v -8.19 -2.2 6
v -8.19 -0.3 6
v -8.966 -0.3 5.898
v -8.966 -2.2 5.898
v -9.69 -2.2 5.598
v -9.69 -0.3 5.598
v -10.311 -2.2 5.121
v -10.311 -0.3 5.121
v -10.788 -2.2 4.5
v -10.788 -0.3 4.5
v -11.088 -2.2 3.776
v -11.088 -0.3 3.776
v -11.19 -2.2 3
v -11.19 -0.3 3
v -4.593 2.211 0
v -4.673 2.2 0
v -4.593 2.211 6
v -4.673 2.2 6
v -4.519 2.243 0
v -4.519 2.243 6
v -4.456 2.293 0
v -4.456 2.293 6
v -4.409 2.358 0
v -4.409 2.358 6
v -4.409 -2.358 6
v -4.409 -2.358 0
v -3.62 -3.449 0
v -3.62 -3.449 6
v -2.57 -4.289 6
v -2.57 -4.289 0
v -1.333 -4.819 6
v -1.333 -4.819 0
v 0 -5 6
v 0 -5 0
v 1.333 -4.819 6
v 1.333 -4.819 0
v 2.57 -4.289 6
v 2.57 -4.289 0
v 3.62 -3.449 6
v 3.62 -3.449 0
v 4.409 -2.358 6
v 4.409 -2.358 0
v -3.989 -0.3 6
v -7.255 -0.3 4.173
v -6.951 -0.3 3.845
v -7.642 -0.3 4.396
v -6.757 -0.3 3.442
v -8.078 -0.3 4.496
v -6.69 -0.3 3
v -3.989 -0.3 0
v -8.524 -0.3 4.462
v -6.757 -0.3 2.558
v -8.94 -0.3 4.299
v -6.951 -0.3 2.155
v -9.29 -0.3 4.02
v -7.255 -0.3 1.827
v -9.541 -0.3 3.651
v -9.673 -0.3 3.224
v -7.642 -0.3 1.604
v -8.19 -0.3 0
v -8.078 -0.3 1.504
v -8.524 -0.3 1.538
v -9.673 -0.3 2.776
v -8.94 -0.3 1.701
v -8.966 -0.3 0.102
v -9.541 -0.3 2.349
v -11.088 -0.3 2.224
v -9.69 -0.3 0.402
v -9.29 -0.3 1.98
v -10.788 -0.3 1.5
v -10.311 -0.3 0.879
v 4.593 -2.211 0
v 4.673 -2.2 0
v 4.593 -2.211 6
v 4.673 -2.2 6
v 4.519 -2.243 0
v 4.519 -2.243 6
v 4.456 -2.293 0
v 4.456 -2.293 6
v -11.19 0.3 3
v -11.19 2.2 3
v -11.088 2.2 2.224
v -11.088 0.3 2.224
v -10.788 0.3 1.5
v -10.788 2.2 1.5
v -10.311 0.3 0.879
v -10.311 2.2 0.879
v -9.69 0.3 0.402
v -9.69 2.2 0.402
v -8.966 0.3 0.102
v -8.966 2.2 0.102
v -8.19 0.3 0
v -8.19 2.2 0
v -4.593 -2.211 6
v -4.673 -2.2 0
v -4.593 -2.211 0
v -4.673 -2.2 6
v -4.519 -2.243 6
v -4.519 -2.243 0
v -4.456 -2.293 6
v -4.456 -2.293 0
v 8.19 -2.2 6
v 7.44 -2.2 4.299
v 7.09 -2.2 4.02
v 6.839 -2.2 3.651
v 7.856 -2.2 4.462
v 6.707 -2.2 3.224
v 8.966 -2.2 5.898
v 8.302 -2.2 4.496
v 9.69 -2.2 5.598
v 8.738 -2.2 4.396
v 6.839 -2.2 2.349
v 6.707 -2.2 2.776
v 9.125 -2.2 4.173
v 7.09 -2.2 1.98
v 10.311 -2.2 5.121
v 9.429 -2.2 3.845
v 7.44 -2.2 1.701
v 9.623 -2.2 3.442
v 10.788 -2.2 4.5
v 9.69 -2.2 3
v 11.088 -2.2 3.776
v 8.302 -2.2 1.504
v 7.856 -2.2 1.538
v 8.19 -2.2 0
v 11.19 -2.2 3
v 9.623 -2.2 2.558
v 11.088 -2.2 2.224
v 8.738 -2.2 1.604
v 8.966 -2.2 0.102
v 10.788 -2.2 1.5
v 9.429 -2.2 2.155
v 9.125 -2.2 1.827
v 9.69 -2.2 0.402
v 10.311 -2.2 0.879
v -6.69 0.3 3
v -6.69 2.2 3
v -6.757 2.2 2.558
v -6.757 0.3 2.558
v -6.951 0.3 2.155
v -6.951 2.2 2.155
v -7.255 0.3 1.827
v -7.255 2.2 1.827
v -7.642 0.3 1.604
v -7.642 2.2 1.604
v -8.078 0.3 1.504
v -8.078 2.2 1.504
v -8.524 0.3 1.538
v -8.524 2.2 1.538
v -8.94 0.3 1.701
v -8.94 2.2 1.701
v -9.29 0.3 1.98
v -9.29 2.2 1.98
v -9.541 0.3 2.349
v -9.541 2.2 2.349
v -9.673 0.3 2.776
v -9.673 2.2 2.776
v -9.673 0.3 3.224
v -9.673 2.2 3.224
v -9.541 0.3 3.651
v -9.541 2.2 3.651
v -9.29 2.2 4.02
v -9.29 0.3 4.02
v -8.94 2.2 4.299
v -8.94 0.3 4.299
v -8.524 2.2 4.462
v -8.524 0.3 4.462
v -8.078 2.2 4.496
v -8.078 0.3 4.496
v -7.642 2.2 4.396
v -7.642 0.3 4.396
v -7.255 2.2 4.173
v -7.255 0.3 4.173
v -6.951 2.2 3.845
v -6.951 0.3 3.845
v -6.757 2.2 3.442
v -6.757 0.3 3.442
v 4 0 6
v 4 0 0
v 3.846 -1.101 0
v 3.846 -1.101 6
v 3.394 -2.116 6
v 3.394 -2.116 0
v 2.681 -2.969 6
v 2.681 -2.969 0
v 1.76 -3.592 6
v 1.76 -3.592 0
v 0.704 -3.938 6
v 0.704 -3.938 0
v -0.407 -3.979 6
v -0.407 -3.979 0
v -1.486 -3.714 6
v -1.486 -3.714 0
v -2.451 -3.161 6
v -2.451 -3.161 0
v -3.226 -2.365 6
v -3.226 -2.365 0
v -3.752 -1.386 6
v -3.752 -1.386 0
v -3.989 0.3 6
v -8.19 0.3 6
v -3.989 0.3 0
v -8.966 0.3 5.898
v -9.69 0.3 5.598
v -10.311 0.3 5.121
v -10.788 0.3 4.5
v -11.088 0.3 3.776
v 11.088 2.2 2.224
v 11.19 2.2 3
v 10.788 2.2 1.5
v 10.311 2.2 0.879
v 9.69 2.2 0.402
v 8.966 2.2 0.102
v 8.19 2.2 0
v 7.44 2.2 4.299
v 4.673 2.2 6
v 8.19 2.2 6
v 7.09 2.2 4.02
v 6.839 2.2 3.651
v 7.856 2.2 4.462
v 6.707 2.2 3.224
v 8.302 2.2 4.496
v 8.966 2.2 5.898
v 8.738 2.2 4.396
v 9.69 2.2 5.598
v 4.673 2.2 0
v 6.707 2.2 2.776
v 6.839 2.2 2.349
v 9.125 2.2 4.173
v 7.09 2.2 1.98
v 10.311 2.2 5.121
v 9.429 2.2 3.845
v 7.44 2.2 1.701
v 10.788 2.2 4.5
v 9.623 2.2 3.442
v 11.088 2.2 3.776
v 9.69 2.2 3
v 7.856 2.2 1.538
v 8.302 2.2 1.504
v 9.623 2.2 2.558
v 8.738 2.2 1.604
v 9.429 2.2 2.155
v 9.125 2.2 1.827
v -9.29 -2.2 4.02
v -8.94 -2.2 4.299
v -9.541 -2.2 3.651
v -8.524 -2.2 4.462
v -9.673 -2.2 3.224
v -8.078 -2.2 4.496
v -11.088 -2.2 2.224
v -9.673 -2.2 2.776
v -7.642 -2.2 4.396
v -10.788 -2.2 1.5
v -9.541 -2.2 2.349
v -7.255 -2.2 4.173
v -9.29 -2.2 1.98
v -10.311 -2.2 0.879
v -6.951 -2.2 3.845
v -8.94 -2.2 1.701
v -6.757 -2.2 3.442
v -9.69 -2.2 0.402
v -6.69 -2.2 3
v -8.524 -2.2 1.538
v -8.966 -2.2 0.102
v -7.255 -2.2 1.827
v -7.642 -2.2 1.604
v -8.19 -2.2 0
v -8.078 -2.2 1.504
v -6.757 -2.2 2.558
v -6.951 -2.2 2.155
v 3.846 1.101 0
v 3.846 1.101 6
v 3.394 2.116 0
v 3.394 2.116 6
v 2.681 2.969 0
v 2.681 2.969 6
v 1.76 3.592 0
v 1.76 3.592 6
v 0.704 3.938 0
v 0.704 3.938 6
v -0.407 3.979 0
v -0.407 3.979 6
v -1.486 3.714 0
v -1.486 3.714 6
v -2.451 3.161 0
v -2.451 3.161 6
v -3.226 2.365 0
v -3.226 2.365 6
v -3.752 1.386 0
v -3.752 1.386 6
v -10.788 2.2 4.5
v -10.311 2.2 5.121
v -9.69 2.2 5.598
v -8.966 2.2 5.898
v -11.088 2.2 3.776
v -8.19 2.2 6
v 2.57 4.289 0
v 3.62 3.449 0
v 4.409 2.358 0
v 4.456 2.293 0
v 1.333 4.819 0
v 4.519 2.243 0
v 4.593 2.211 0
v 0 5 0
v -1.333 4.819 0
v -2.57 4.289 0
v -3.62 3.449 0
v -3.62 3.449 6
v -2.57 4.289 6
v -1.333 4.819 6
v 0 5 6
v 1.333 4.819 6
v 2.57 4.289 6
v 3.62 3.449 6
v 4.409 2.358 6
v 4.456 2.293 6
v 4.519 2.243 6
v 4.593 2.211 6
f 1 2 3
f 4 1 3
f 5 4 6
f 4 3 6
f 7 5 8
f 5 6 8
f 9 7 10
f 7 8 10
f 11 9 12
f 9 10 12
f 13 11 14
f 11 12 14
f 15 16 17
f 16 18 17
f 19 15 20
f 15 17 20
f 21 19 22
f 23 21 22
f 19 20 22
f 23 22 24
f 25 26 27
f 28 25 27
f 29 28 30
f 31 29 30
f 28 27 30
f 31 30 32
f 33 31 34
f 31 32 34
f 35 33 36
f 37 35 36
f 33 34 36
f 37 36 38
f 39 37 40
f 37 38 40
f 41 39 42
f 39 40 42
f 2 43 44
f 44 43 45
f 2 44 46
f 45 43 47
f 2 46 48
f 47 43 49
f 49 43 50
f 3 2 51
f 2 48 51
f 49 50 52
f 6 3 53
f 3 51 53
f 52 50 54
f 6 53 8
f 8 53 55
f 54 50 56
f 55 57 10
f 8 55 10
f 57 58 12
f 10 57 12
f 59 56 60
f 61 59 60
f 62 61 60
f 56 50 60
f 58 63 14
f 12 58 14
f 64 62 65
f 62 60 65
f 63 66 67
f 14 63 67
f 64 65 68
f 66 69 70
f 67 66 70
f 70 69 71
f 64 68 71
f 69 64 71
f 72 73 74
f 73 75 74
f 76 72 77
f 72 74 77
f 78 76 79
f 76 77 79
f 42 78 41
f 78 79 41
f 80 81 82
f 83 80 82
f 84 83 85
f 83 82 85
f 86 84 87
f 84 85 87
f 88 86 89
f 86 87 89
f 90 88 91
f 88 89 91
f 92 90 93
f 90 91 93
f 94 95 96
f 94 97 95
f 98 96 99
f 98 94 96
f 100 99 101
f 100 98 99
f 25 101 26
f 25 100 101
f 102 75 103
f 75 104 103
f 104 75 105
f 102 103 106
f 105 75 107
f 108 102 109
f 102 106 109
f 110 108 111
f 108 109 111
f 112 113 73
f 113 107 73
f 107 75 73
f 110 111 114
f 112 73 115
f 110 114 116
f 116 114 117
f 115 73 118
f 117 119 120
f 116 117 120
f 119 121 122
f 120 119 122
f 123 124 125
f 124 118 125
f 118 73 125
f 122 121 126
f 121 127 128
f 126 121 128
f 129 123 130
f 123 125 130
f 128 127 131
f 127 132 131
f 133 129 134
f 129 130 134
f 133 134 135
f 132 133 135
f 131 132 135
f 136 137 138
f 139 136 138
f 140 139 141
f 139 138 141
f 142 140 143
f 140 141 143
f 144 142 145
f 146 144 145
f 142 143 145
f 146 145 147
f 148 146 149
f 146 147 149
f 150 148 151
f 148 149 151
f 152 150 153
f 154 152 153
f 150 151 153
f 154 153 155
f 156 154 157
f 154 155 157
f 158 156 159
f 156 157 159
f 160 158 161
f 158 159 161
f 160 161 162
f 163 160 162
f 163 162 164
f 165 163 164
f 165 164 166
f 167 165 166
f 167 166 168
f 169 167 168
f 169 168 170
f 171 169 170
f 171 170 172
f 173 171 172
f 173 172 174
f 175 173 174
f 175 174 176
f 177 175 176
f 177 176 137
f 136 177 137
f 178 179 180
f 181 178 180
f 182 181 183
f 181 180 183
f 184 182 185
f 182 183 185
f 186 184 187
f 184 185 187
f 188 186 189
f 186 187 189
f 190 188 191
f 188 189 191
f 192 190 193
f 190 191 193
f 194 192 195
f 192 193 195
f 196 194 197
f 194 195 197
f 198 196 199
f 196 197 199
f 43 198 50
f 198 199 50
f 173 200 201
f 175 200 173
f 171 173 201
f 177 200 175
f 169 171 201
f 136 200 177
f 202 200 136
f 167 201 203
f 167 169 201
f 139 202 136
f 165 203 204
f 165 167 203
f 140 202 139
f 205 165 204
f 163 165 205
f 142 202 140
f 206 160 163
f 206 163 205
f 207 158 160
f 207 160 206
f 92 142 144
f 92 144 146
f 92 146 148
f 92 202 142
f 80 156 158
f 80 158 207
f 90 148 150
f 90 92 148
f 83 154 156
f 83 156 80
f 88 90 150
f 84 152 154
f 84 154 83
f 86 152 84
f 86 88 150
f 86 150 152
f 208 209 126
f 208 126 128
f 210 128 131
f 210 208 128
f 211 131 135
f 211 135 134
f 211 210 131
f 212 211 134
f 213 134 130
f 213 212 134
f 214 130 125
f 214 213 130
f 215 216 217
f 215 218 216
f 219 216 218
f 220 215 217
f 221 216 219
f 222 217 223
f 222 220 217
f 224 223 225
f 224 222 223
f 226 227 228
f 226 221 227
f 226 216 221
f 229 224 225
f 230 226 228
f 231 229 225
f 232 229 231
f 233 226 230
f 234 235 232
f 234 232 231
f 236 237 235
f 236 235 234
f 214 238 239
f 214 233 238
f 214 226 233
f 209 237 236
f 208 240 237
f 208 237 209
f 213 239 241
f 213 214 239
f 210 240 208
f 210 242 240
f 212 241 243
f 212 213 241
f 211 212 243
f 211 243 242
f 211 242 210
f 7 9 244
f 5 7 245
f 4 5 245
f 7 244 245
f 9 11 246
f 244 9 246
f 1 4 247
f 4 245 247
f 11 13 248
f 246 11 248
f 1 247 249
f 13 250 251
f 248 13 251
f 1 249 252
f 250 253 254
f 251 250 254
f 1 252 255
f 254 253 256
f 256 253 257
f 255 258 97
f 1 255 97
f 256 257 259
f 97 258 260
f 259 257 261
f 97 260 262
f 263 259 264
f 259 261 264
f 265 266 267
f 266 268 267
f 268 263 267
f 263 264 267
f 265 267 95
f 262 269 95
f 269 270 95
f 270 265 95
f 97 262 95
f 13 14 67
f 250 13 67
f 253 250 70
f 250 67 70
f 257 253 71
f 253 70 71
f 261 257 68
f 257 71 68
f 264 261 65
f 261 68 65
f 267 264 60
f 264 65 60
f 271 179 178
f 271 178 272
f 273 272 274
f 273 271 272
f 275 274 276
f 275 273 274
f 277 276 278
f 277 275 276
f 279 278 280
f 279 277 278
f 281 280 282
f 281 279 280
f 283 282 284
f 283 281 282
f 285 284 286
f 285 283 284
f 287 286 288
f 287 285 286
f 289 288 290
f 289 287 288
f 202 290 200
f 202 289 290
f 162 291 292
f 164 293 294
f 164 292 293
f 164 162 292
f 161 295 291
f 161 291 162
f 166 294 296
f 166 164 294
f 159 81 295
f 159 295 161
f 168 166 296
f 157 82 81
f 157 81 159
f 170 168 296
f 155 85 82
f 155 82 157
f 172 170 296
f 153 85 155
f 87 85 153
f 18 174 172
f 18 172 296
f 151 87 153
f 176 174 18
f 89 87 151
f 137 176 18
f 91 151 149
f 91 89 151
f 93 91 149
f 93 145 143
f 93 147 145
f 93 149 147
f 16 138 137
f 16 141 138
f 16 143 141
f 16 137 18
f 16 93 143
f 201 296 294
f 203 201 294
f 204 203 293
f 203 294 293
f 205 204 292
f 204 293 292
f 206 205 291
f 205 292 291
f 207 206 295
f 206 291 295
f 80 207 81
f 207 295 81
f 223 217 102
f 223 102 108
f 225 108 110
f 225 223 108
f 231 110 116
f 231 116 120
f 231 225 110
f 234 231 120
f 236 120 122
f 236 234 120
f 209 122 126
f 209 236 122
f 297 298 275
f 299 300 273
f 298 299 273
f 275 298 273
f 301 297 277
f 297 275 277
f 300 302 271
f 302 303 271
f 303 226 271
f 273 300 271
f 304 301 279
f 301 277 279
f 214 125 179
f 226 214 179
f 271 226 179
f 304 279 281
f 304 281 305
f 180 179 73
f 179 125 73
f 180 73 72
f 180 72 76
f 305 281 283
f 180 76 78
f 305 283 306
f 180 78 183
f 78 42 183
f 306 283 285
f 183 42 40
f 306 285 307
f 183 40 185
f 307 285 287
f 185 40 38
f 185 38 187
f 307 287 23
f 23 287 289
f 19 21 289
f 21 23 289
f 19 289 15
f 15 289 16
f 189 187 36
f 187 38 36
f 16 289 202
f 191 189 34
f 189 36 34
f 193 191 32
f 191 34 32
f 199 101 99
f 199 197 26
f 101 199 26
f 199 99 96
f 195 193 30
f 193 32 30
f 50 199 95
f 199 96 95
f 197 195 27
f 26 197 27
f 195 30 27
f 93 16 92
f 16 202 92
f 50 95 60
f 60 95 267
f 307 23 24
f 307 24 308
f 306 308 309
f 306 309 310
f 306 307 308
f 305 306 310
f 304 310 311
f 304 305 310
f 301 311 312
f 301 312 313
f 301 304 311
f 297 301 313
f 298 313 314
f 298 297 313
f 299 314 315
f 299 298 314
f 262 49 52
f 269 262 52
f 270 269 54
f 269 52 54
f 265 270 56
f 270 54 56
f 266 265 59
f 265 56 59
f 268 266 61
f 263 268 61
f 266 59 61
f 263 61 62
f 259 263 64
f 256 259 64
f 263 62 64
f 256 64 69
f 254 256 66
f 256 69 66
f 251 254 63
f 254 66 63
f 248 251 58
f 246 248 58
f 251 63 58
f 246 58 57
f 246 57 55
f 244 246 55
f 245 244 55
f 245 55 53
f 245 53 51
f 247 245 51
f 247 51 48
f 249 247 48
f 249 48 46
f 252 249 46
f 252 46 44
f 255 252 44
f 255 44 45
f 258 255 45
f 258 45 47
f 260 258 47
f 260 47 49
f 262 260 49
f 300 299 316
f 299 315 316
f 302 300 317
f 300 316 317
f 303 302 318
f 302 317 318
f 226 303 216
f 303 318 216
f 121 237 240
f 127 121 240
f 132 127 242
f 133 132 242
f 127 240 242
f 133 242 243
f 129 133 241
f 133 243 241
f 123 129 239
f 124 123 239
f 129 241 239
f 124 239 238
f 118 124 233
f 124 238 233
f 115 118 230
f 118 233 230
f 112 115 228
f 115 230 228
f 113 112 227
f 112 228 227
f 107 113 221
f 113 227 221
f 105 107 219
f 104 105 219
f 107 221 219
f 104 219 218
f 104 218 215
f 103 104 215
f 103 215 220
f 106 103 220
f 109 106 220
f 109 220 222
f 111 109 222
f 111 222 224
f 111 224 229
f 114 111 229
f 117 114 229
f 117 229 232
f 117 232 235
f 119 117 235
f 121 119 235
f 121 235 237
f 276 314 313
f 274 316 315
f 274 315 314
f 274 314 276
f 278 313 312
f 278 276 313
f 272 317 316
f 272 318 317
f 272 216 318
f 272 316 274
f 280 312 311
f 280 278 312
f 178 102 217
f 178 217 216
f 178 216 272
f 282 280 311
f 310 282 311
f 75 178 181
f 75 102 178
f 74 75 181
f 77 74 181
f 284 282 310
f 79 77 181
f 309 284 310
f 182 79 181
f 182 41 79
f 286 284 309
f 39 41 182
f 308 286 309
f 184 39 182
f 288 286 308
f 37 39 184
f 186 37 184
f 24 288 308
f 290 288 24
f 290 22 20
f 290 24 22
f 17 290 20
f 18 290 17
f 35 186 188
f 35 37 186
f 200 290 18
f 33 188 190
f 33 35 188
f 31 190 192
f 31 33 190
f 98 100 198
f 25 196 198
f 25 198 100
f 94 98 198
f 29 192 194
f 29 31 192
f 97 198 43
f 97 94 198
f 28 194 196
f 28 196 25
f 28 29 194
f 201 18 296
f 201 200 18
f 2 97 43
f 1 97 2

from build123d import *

# Parameters (mm, degrees)
EXTRUDE_1_DEPTH     = 6
CUT_EXTRUDE_1_DEPTH = 8.2
SKETCH_4_R          = 1.5
CUT_EXTRUDE_2_DEPTH = 8.2
FILLET_1_R          = 0.3


with BuildPart() as part:
    # 草图2 → 凸台-拉伸1 (new body)
    with BuildSketch(Plane.XY):
        with BuildLine():
            Line((-11.189988864, 0.3), (-11.189988864, 2.2))
            Line((-11.189988864, 2.2), (-4.489988864, 2.2))
            ThreePointArc((-4.489988864, 2.2), (0, 5), (4.489988864, 2.2))
            Line((4.489988864, 2.2), (11.189988864, 2.2))
            Line((11.189988864, 2.2), (11.189988864, 0))
            Line((11.189988864, 0), (4, 0))
            ThreePointArc((4, 0), (0.150105729, 3.997182541), (-3.988734135, 0.3))
            Line((-3.988734135, 0.3), (-11.189988864, 0.3))
        make_face()
    extrude_1 = extrude(amount=EXTRUDE_1_DEPTH)

    # 镜向2: 凸台-拉伸1 across plane
    add(extrude_1.mirror(Plane.ZX))

    # 草图3 → 切除-拉伸1 (cut, through all)
    with BuildSketch(Plane(origin=(0, 2.2, 0), x_dir=(1, 0, 0), z_dir=(0, 1, 0))):
        with BuildLine():
            ThreePointArc((-11.189988864, -3), (-10.311309208, -0.878679656), (-8.189988864, 0))
            Line((-8.189988864, 0), (-11.189988864, 0))
            Line((-11.189988864, 0), (-11.189988864, -3))
        make_face()
        with BuildLine():
            ThreePointArc((-8.189988864, -6), (-10.311309208, -5.121320344), (-11.189988864, -3))
            Line((-11.189988864, -3), (-11.189988864, -6))
            Line((-11.189988864, -6), (-8.189988864, -6))
        make_face()
    cut_extrude_1 = extrude(amount=-CUT_EXTRUDE_1_DEPTH, mode=Mode.SUBTRACT)

    # 镜向1: 切除-拉伸1 across plane
    add(cut_extrude_1.mirror(Plane(origin=(0, 0, 0), x_dir=(0, 0, 1), z_dir=(1, 0, 0))), mode=Mode.SUBTRACT)

    # 草图4 → 切除-拉伸2 (cut, through all)
    with BuildSketch(Plane(origin=(0, 2.2, 0), x_dir=(1, 0, 0), z_dir=(0, 1, 0))):
        with Locations((-8.189988864, -3)):
            Circle(SKETCH_4_R)
        with Locations((8.189988864, -3)):
            Circle(SKETCH_4_R)
    extrude(amount=-CUT_EXTRUDE_2_DEPTH, mode=Mode.SUBTRACT)

    # 圆角1
    fillet_1_edges = [part.edges().sort_by_distance(p)[0] for p in [
        (-4.489988864, 2.2, 3),
        (4.489988864, 2.2, 3),
        (-4.489988864, -2.2, 3),
        (4.489988864, -2.2, 3),
    ]]
    fillet(fillet_1_edges, radius=FILLET_1_R)


solid = part.part
